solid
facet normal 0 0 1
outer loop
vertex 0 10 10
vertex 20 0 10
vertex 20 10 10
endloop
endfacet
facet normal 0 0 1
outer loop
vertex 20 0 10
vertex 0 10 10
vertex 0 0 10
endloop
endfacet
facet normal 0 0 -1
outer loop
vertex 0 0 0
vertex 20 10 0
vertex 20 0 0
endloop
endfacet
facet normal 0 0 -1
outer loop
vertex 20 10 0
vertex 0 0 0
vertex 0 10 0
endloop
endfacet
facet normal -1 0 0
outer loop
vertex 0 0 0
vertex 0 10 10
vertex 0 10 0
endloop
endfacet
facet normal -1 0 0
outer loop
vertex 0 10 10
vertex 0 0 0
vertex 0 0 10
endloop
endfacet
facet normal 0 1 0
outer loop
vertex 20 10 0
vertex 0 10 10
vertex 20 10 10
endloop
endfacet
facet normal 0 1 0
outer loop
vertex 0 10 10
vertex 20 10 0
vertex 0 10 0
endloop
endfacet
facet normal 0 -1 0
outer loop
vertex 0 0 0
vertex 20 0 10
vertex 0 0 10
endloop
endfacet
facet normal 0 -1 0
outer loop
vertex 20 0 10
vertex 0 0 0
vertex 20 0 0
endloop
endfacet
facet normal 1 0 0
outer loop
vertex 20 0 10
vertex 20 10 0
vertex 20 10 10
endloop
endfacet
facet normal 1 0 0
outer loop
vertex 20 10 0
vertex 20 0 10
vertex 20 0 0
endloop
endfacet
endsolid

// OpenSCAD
// SYMPTOM: imported booleans came back as self-intersecting / invalid shells;
//   STEP export then failed or produced bad geometry.
// CAUSE: importer booleans inherited the Mod/Part preference RefineModel=true,
//   so removeSplitter ran and turned OpenSCAD's tangent / near-coincident faces
//   (common where parts butt together) into self-intersecting shells.
// FIX: importCSG.py -> new addBoolean() helper creates EVERY importer boolean
//   with Refine=False (no removeSplitter). Commit 3ea6eb73e2.
// EXPECTED (OpenSCAD): two unit cubes meeting on the tangent plane x=10 union
//   into one valid solid of volume 2000 (no self-intersection).
union() {
	cube([10, 10, 10]);
	translate([10, 0, 0]) cube([10, 10, 10]);
}
